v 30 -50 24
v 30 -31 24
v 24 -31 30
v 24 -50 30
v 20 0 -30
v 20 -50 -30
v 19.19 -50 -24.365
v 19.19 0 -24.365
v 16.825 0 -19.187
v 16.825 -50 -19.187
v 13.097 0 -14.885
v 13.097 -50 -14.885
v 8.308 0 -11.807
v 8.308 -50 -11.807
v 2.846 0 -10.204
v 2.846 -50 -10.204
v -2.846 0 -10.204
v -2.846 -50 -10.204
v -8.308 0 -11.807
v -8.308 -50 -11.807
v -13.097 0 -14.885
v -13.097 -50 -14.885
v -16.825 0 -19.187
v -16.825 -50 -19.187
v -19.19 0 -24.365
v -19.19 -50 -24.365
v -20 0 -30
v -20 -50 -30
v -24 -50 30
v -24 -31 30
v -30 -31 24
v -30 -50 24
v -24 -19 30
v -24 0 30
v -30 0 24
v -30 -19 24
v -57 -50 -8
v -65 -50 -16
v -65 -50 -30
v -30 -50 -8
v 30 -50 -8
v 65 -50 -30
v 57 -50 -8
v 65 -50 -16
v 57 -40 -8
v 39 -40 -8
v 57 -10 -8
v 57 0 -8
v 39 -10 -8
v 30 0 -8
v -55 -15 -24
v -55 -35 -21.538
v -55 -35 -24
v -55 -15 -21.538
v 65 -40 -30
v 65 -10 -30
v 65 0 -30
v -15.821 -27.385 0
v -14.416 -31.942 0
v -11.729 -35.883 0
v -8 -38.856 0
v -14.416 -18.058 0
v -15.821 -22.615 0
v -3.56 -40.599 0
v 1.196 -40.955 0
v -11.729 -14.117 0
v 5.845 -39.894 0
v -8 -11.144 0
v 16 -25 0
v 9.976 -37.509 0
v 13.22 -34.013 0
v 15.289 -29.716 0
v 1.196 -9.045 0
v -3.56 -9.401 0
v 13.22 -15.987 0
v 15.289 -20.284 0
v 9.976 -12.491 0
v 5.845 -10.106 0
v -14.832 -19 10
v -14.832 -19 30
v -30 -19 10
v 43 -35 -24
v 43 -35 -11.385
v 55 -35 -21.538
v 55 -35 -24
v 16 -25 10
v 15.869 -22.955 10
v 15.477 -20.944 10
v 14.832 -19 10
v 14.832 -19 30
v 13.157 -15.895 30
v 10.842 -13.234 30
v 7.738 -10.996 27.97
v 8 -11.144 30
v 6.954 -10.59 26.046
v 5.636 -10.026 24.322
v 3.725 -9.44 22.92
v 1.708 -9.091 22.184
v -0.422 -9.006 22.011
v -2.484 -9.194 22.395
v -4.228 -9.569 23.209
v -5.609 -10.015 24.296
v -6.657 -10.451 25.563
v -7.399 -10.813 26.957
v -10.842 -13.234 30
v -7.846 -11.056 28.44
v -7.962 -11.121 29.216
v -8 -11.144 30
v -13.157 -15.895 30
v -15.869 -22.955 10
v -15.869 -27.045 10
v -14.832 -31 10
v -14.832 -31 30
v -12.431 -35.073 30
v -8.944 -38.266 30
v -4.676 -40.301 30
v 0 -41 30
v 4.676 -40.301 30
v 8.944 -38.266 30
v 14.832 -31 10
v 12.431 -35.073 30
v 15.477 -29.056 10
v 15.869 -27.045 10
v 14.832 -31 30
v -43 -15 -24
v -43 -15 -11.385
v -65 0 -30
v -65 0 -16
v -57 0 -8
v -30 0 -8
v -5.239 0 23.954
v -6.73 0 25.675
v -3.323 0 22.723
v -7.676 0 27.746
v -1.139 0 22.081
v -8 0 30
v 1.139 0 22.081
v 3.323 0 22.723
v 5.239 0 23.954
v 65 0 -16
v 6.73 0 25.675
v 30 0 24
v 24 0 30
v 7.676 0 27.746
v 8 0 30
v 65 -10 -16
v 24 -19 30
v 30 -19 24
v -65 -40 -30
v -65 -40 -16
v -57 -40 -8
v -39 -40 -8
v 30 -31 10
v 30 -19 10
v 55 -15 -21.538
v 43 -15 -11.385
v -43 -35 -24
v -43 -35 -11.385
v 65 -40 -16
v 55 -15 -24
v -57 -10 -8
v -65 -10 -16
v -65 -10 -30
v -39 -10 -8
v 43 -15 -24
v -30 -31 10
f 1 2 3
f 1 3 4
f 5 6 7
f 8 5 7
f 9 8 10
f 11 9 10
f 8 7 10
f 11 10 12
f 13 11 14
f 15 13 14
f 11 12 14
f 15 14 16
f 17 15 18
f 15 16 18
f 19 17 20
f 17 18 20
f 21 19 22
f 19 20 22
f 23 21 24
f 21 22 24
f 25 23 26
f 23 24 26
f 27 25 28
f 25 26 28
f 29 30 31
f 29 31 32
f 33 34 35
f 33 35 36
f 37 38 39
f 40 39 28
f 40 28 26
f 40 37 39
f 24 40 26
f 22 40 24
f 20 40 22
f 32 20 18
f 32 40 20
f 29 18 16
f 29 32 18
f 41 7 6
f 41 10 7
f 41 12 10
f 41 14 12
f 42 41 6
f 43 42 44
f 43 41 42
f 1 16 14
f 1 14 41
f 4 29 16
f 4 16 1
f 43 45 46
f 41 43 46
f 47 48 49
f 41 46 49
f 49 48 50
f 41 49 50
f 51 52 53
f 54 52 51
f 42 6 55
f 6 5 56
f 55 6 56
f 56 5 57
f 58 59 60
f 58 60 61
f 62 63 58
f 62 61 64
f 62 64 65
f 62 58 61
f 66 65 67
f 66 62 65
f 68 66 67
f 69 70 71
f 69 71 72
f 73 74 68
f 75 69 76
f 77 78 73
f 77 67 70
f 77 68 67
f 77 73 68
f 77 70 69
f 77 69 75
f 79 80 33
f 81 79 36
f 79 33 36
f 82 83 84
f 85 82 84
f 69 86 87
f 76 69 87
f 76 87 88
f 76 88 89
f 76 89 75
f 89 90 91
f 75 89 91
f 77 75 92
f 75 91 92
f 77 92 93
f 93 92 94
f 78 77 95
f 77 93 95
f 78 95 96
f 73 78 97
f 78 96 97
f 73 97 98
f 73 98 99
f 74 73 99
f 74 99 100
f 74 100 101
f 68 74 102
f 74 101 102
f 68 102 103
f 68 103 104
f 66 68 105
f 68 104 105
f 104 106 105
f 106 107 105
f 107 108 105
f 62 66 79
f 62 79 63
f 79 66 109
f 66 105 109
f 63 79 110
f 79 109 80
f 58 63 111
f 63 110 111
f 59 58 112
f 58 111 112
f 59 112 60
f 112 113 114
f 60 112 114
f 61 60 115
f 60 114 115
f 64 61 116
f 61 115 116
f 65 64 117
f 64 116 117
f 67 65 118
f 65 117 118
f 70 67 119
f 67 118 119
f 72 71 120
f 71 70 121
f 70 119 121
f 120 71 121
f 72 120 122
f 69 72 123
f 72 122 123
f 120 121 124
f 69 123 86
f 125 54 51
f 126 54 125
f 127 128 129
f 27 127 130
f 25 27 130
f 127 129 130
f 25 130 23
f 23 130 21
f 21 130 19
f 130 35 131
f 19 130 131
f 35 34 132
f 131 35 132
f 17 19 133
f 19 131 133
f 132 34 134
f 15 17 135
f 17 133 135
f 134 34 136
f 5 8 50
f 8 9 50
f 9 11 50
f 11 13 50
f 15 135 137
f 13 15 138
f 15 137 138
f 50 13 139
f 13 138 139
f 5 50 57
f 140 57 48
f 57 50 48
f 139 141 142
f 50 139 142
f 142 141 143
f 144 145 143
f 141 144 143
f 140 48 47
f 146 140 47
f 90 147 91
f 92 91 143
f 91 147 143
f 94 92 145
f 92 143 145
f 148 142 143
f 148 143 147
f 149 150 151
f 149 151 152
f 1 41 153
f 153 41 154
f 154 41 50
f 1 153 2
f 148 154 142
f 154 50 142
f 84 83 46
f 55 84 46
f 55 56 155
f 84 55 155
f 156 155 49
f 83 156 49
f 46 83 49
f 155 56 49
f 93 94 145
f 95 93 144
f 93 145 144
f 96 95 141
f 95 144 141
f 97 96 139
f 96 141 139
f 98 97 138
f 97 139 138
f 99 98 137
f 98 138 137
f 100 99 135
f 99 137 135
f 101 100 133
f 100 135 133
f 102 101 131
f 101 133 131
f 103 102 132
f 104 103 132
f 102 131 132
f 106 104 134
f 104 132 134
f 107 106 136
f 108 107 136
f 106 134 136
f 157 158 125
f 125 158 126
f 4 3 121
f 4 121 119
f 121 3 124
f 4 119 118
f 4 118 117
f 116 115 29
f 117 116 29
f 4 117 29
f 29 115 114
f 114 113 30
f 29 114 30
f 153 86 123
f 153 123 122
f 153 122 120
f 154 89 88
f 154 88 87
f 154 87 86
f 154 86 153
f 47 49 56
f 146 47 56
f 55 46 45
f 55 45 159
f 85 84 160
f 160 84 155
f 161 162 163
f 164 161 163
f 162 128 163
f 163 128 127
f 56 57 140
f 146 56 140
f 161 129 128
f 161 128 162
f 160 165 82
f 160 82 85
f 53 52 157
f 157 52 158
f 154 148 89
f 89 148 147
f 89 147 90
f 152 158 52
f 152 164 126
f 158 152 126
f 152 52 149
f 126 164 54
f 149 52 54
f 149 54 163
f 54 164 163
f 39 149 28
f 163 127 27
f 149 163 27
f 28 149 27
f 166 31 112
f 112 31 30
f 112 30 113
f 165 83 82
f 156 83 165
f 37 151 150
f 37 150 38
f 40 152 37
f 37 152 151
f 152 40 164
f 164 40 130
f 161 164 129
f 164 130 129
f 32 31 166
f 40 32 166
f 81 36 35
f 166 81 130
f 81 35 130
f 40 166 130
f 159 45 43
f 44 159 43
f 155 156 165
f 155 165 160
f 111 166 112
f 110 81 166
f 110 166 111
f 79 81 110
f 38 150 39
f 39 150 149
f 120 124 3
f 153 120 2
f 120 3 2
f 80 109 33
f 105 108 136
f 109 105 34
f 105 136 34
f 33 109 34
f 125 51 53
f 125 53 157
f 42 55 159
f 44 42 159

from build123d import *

# Parameters (mm, degrees)
F1_DEPTH  = 50
F2_SIZE   = 8
F3_SIZE   = 6
F4_W      = 6
F4_H      = 12
F5_DEPTH  = 20
F6_R      = 16
F7_DEPTH  = 30
F8_R      = 8
F9_DEPTH  = 25.4
F10_W     = 110.0508913994
F10_H     = 30
F11_DEPTH = 22.001
F12_W     = 112.4475047588
F12_H     = 30
F13_DEPTH = 22.001
F15_DEPTH = 30
F17_DEPTH = 30
F18_W     = 12
F18_H     = 20
F19_DEPTH = 16
F20_W     = 12
F20_H     = 20
F21_DEPTH = 16
F22_R     = 20
F23_DEPTH = 50.0010001


with BuildPart() as f1:
    # F0 (on Front) → F1 (new body)
    with BuildSketch(Plane.XZ):
        Polygon((-65, -8), (-65, -30), (65, -30), (65, -8), (30, -8), (30, 30), (-30, 30), (-30, -8), align=None)
    extrude(amount=F1_DEPTH)

    # F2
    f2_edges = [f1.edges().sort_by_distance(p)[0] for p in [
        (-65, -25, -8),
        (65, -25, -8),
    ]]
    chamfer(f2_edges, length=F2_SIZE)

    # F3
    f3_edges = [f1.edges().sort_by_distance(p)[0] for p in [
        (-30, -25, 30),
        (30, -25, 30),
    ]]
    chamfer(f3_edges, length=F3_SIZE)

    # F4 (on face) → F5 (cut)
    with BuildSketch(Plane.XY.offset(30)):
        with Locations((-27, -25)):
            Rectangle(F4_W, F4_H)
        with Locations((27, -25)):
            Rectangle(F4_W, F4_H)
        with BuildLine():
            Line((-24, -19), (-24, -31))
            Line((-24, -31), (-14.8323969742, -31))
            ThreePointArc((-14.8323969742, -31), (-16, -25), (-14.8323969742, -19))
            Line((-14.8323969742, -19), (-24, -19))
        make_face()
        with BuildLine():
            ThreePointArc((16, -25), (15.70538684, -28.0562761993), (14.8323969742, -31))
            Line((14.8323969742, -31), (24, -31))
            Line((24, -31), (24, -19))
            Line((24, -19), (14.8323969742, -19))
            ThreePointArc((14.8323969742, -19), (15.70538684, -21.9437238007), (16, -25))
        make_face()
    extrude(amount=-F5_DEPTH, mode=Mode.SUBTRACT)

    # F6 (on face) → F7 (cut)
    with BuildSketch(Plane.XY.offset(30)):
        with Locations((0, -25)):
            Circle(F6_R)
    extrude(amount=-F7_DEPTH, mode=Mode.SUBTRACT)

    # F8 (on face) → F9 (cut)
    with BuildSketch(Plane(origin=(0, 0, 0), x_dir=(-1, 0, 0), z_dir=(0, 1, 0))):
        with Locations((0, 30)):
            Circle(F8_R)
    extrude(amount=-F9_DEPTH, mode=Mode.SUBTRACT)

    # F10 (on face) → F11 (cut, through all)
    with BuildSketch(Plane.XY.offset(-8)):
        with Locations((-94.0254456997, -25)):
            Rectangle(F10_W, F10_H)
    extrude(amount=-F11_DEPTH, mode=Mode.SUBTRACT)

    # F12 (on face) → F13 (cut, through all)
    with BuildSketch(Plane.XY.offset(-8)):
        with Locations((95.2237523794, -25)):
            Rectangle(F12_W, F12_H)
    extrude(amount=-F13_DEPTH, mode=Mode.SUBTRACT)

    # F14 (on face) → F15 (join)
    with BuildSketch(Plane.XZ.offset(10)):
        Polygon((39, -30), (65, -30), (39, -8), align=None)
    extrude(amount=F15_DEPTH)

    # F16 (on face) → F17 (join)
    with BuildSketch(Plane.XZ.offset(10)):
        Polygon((-65, -30), (-39, -30), (-39, -8), align=None)
    extrude(amount=F17_DEPTH)

    # F18 (on face) → F19 (cut)
    with BuildSketch(Plane.XY.offset(-8)):
        with Locations((49, -25)):
            Rectangle(F18_W, F18_H)
    extrude(amount=-F19_DEPTH, mode=Mode.SUBTRACT)

    # F20 (on face) → F21 (cut)
    with BuildSketch(Plane.XY.offset(-8)):
        with Locations((-49, -25)):
            Rectangle(F20_W, F20_H)
    extrude(amount=-F21_DEPTH, mode=Mode.SUBTRACT)

    # F22 (on face) → F23 (cut, through all)
    with BuildSketch(Plane.XZ.offset(50)):
        with Locations((0, -30)):
            Circle(F22_R)
    extrude(amount=-F23_DEPTH, mode=Mode.SUBTRACT)


solid = f1.part
